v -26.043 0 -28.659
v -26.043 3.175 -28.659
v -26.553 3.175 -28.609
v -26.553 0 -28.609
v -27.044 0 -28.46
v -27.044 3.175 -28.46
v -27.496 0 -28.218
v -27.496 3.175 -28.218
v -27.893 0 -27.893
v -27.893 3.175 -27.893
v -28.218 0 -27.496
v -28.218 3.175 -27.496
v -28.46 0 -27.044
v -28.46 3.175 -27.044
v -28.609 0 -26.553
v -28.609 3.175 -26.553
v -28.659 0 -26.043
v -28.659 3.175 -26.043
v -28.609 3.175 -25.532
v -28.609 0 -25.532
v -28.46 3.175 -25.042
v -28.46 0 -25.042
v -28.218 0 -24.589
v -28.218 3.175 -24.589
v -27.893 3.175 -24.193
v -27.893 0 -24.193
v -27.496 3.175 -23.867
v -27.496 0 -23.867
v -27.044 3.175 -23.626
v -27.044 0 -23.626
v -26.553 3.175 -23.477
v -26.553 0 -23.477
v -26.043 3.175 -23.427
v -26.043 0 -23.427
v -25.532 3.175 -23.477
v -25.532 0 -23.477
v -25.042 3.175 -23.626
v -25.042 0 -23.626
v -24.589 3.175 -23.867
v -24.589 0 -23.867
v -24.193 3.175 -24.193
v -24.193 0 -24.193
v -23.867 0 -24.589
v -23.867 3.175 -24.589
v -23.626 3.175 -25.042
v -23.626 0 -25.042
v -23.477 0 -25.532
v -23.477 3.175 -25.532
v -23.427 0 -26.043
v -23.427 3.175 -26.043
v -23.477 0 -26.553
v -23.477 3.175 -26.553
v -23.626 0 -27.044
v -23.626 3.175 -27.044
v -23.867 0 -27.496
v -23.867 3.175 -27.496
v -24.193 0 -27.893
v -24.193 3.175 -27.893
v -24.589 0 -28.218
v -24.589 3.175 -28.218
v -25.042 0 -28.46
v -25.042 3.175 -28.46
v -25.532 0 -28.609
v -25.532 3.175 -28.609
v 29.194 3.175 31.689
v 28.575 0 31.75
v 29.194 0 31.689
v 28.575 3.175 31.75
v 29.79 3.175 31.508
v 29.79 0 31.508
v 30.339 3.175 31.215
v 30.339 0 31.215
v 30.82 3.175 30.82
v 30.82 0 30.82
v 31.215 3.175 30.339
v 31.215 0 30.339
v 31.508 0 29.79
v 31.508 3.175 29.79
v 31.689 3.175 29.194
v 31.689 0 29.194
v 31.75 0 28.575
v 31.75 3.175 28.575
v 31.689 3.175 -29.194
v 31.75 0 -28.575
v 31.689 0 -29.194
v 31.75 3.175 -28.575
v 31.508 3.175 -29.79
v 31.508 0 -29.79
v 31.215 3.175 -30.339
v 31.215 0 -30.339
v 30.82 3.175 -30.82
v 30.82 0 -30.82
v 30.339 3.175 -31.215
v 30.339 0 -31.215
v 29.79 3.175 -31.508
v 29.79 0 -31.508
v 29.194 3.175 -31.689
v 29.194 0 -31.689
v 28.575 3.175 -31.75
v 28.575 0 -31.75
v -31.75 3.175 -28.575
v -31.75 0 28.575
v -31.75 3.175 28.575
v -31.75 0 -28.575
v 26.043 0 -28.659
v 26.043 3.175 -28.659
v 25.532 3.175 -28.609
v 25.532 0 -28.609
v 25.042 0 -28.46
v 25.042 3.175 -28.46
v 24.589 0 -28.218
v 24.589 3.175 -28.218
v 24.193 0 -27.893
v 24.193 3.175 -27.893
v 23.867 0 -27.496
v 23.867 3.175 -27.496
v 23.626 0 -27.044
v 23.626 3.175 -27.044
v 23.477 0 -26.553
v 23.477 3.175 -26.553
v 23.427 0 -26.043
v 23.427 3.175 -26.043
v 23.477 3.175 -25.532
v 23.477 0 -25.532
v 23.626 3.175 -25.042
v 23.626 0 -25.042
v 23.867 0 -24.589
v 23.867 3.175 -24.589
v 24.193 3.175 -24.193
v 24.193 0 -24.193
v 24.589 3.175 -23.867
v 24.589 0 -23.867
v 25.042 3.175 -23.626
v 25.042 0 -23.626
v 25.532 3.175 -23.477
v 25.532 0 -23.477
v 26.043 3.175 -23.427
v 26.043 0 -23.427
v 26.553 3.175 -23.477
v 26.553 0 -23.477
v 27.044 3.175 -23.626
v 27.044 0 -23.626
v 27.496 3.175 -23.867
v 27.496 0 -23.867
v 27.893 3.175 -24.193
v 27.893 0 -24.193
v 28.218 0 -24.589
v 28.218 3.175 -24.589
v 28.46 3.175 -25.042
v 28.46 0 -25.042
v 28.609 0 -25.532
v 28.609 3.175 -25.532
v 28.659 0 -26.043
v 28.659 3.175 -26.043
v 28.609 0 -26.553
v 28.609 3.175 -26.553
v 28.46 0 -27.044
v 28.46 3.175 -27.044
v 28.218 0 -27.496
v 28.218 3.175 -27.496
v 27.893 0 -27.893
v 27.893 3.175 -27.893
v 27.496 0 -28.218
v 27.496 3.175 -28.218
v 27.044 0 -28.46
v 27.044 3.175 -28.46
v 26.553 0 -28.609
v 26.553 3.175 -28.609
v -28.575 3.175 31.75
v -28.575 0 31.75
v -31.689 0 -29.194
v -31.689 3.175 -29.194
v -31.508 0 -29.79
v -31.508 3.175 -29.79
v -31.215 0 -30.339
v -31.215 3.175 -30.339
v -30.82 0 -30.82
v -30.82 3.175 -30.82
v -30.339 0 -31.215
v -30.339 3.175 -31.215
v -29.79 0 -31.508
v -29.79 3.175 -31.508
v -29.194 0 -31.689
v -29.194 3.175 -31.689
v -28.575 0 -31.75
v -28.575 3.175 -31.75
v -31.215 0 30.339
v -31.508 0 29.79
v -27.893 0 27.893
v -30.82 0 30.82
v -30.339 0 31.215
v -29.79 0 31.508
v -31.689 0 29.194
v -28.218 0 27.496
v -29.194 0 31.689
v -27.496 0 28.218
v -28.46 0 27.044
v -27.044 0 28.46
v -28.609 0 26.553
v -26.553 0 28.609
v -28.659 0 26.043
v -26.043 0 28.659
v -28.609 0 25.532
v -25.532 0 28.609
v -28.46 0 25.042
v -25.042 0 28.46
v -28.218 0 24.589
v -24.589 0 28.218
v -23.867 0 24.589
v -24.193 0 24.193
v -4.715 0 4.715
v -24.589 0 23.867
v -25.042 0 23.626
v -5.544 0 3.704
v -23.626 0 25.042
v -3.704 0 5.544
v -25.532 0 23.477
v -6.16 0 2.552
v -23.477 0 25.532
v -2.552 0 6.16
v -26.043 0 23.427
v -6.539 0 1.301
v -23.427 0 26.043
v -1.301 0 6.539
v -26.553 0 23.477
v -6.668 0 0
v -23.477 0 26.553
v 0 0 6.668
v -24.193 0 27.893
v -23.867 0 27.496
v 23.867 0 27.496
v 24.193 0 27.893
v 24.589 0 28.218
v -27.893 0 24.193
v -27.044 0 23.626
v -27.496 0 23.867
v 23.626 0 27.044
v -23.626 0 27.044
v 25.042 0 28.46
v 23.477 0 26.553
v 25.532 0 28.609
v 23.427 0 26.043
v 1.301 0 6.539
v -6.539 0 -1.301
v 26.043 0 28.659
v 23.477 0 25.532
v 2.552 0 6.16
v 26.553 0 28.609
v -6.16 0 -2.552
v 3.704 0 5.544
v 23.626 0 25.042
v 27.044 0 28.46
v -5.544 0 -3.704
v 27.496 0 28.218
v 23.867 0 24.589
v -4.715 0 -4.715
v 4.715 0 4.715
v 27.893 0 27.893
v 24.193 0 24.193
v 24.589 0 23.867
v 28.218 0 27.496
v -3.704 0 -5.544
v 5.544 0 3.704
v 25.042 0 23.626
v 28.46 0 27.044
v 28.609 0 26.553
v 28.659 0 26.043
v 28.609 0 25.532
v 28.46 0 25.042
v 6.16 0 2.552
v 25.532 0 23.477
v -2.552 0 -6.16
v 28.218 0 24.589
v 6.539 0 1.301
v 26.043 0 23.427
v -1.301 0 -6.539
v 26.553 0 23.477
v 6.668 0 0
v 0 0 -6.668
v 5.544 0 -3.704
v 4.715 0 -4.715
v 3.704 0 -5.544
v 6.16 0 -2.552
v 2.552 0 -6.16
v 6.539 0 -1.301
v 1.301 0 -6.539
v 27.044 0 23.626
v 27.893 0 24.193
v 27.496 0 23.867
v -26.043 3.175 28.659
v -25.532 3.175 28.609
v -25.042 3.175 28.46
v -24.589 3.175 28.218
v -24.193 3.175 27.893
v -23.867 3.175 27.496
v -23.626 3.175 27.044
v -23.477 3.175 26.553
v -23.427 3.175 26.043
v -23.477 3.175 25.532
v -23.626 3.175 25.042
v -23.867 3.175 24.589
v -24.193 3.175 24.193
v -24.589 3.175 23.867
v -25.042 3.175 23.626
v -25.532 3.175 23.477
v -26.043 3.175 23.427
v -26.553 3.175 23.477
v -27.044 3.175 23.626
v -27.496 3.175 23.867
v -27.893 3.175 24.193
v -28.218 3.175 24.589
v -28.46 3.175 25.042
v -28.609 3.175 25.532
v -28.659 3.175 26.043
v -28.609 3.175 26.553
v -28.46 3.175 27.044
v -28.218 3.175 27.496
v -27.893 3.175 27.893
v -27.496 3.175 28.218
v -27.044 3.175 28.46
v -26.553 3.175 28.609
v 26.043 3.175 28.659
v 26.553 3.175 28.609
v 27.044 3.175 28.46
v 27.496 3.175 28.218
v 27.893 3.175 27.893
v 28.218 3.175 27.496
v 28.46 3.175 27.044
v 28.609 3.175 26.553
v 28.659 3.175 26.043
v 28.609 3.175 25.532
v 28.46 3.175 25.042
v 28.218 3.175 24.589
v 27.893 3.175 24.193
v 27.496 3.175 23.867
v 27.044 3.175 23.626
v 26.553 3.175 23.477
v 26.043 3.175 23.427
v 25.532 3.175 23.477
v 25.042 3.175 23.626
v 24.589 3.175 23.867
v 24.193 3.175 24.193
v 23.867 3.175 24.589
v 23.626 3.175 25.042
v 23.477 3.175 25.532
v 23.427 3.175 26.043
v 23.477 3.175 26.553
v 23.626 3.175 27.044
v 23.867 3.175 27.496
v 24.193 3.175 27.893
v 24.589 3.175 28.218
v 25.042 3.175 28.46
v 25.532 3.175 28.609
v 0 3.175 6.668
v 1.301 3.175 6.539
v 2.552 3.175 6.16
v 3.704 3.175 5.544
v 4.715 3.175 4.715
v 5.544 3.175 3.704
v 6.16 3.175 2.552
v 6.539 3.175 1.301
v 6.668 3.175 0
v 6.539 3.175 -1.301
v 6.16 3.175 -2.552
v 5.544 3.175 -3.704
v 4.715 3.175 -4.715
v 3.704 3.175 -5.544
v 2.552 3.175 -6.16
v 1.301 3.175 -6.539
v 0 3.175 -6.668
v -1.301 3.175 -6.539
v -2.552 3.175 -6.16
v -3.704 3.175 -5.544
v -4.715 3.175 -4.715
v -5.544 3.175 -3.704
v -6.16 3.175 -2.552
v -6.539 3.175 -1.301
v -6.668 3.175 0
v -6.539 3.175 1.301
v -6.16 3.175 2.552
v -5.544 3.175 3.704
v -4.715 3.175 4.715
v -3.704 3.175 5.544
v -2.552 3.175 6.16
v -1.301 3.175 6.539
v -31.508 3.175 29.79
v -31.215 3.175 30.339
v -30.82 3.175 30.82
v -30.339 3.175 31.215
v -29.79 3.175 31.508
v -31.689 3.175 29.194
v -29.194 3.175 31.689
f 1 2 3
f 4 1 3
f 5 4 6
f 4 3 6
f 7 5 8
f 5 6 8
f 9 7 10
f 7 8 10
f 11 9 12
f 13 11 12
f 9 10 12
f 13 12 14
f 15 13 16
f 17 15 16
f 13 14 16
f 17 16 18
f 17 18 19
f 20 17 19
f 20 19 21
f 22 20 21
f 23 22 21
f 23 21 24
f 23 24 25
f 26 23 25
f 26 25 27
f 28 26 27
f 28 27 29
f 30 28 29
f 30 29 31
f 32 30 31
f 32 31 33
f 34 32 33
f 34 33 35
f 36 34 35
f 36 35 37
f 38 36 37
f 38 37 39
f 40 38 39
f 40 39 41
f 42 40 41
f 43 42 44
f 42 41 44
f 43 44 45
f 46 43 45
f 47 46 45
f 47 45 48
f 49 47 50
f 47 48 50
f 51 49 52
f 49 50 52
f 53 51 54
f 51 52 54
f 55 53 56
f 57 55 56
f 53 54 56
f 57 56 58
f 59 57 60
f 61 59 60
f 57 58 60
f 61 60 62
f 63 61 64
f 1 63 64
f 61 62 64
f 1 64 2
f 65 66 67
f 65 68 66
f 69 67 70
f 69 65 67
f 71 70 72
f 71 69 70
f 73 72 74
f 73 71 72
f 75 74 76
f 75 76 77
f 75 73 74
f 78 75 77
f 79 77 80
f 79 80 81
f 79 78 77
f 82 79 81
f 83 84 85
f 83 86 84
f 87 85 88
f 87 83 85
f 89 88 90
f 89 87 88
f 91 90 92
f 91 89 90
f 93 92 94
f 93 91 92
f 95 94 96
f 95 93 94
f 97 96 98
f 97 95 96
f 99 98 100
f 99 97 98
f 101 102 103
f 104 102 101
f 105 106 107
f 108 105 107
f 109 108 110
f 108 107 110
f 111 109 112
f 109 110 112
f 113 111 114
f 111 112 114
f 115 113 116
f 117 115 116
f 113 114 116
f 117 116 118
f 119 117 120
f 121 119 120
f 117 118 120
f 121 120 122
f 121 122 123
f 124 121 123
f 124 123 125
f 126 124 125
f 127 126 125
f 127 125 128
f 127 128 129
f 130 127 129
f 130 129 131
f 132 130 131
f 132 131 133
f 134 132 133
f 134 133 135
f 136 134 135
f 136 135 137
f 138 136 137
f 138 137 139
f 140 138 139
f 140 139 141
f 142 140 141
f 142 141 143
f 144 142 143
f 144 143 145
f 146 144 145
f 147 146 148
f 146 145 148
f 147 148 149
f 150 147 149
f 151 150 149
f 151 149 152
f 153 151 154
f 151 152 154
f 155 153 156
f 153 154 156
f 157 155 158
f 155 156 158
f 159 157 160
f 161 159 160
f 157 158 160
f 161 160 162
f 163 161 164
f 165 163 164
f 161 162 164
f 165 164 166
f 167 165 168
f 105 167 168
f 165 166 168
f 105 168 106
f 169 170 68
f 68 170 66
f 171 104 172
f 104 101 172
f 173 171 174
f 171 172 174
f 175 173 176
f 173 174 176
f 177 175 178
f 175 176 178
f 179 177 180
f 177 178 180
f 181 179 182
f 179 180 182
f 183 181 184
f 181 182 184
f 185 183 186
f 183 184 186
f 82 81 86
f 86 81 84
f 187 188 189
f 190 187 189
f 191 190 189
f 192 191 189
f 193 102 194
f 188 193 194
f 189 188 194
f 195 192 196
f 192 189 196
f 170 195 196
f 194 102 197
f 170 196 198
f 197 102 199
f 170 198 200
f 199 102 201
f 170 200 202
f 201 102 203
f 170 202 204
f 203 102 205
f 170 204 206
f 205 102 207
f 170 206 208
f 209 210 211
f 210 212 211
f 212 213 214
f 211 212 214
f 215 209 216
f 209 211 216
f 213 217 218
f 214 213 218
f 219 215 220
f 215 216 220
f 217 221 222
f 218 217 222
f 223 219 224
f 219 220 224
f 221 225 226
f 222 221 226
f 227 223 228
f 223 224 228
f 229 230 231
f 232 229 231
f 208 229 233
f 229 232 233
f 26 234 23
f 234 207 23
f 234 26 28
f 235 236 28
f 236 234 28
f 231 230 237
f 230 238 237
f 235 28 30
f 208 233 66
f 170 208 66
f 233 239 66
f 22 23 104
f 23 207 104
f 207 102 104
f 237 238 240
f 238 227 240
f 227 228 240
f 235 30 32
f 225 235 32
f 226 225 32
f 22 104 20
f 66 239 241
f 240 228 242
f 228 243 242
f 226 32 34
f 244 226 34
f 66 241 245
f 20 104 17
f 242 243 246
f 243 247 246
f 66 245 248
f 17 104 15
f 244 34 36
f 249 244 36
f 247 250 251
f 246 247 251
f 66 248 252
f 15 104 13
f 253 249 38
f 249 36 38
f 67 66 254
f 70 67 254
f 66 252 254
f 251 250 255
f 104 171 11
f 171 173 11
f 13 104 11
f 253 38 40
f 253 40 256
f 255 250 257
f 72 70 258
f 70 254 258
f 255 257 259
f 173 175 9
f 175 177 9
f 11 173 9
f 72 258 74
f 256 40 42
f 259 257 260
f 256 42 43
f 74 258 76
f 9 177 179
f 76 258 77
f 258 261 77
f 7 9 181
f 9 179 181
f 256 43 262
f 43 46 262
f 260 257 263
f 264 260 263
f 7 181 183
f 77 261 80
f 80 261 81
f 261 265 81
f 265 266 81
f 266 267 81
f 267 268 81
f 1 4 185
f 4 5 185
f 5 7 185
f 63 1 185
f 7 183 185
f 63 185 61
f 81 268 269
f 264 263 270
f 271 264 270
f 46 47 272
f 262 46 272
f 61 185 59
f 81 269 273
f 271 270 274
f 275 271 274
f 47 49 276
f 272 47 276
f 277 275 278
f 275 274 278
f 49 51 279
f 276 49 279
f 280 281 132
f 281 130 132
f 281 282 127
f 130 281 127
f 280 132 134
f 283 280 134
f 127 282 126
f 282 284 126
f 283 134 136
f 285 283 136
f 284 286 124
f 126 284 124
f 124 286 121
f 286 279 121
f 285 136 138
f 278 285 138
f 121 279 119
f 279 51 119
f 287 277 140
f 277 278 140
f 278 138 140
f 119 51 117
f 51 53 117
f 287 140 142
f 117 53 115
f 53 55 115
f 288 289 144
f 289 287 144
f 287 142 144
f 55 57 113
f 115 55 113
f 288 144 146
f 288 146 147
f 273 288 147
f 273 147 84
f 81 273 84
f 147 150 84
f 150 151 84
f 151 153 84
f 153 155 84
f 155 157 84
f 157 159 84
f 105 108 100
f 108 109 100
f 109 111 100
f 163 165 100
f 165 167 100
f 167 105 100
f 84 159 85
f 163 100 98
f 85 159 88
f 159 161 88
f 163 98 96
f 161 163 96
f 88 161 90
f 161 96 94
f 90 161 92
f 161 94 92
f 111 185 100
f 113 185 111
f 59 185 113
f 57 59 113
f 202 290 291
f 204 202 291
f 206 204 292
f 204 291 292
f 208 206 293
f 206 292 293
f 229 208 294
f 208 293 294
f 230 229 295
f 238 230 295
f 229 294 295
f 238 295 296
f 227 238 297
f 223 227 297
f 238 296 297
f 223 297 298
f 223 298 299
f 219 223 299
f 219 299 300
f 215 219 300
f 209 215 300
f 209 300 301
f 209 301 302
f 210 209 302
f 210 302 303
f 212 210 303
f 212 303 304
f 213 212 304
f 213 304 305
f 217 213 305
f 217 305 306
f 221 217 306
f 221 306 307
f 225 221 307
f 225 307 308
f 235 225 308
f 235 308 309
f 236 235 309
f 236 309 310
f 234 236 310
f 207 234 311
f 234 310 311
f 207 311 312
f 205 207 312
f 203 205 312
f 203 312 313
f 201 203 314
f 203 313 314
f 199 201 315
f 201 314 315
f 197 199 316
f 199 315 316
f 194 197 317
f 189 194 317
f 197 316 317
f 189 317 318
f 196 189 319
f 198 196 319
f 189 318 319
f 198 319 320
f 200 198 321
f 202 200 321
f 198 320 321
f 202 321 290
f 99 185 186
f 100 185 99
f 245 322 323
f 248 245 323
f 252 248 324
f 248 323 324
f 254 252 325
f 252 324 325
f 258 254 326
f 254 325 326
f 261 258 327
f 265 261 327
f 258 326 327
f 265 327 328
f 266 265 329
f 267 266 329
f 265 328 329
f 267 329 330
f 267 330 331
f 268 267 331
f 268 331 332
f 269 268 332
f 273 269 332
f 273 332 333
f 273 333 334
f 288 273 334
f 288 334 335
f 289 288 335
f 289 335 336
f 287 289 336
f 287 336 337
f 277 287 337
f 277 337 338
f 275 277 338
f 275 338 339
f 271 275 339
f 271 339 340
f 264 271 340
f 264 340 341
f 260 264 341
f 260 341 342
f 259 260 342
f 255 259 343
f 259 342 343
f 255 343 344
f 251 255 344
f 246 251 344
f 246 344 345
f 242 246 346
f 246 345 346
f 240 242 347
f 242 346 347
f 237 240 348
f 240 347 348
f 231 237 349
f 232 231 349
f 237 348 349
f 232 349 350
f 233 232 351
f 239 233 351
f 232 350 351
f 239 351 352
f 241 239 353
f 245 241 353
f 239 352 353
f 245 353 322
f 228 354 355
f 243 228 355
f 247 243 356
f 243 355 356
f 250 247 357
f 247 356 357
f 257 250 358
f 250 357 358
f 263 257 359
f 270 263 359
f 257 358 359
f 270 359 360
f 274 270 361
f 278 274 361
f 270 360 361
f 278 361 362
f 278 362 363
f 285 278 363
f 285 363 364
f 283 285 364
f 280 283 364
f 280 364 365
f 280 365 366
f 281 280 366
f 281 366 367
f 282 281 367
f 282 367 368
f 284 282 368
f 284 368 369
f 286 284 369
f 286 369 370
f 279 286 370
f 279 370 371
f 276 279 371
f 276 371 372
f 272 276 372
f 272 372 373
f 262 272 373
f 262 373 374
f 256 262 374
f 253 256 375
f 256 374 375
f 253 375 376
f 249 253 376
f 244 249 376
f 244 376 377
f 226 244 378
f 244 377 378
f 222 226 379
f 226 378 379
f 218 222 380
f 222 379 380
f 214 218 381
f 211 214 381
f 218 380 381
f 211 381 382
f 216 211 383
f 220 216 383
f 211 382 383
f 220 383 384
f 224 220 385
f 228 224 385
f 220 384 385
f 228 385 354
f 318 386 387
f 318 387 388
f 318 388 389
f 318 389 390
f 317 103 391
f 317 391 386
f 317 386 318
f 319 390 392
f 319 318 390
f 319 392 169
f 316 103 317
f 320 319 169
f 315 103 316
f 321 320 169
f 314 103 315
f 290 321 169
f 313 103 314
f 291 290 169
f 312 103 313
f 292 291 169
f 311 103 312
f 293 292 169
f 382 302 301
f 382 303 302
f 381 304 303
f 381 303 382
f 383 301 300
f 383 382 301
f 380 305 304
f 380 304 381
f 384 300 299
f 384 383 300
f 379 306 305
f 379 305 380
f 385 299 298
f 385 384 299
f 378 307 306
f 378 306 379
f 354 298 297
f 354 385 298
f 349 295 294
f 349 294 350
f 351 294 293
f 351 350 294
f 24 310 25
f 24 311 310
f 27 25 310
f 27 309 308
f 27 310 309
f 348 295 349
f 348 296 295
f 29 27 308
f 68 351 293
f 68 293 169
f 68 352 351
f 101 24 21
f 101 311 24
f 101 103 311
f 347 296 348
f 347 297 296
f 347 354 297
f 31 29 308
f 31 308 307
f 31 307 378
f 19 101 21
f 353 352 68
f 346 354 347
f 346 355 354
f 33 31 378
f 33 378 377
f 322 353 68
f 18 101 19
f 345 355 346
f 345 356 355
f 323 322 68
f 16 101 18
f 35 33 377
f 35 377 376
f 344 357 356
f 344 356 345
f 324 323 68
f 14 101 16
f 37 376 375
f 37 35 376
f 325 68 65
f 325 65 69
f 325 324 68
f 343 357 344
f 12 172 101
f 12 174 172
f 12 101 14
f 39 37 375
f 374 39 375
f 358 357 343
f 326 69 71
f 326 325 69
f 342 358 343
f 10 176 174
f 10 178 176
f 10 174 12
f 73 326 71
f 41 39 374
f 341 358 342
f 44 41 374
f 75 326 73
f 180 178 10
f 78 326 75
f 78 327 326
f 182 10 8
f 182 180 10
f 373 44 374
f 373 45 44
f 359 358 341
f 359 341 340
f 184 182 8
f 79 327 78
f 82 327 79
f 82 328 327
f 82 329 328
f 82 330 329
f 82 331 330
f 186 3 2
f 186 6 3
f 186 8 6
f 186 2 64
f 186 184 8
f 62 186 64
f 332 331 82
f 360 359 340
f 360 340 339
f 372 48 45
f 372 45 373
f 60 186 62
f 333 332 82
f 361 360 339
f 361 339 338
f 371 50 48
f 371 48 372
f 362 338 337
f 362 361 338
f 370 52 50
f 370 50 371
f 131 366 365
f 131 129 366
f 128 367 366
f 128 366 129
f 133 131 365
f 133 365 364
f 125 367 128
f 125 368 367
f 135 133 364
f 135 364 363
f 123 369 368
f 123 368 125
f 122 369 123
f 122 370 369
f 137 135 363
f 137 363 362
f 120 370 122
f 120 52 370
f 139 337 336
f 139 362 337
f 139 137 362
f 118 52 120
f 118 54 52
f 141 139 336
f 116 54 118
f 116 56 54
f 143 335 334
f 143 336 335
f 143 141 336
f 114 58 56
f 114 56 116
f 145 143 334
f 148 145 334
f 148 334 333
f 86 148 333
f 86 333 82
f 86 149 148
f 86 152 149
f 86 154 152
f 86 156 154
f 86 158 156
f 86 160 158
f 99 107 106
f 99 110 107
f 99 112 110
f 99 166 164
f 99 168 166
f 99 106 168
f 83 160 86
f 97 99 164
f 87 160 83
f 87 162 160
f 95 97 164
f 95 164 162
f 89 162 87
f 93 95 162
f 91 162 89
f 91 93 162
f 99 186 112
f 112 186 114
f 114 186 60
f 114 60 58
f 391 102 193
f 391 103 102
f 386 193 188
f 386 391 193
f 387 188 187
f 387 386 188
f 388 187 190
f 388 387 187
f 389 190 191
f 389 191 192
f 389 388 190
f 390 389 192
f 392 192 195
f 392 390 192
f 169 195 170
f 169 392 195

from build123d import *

# Parameters (mm, degrees)
SKETCH1_W           = 63.5
SKETCH1_H           = 63.5
BOSS_EXTRUDE1_DEPTH = 3.175
FILLET1_R           = 3.175
CUT_EXTRUDE1_REACH  = 47.013
SKETCH2_R           = 6.6675
CUT_EXTRUDE2_REACH  = 47.013
SKETCH3_R           = 2.6162


with BuildPart() as part:
    # Sketch1 → Boss-Extrude1 (new body)
    with BuildSketch(Plane(origin=(0, 0, 0), x_dir=(1, 0, 0), z_dir=(0, 1, 0))):
        Rectangle(SKETCH1_W, SKETCH1_H)
    extrude(amount=BOSS_EXTRUDE1_DEPTH)

    # Fillet1
    fillet1_edges = [part.edges().sort_by_distance(p)[0] for p in [
        (31.75, 1.5875, 31.75),
        (-31.75, 1.5875, 31.75),
        (-31.75, 1.5875, -31.75),
        (31.75, 1.5875, -31.75),
    ]]
    fillet(fillet1_edges, radius=FILLET1_R)

    # Sketch2 → Cut-Extrude1 (cut, up to next)
    with BuildSketch(Plane(origin=(0, 3.175, 0), x_dir=(1, 0, 0), z_dir=(0, 1, 0)), mode=Mode.PRIVATE) as cut_extrude1_sk1:
        with Locations(Location((0, 0, 0), (0, 0, 270))):
            Circle(SKETCH2_R)
    cut_extrude1_tool1 = extrude(cut_extrude1_sk1.sketch, amount=-CUT_EXTRUDE1_REACH, mode=Mode.PRIVATE) & part.part
    add(cut_extrude1_tool1.solids().sort_by_distance((0, 3.175, 0))[0], mode=Mode.SUBTRACT)

    # Sketch3 → Cut-Extrude2 (cut, up to next)
    with BuildSketch(Plane(origin=(0, 3.175, 0), x_dir=(1, 0, 0), z_dir=(0, 1, 0)), mode=Mode.PRIVATE) as cut_extrude2_sk1:
        with Locations(Location((26.042742751, -26.042742751, 0), (0, 0, 270))):
            Circle(SKETCH3_R)
    cut_extrude2_tool1 = extrude(cut_extrude2_sk1.sketch, amount=-CUT_EXTRUDE2_REACH, mode=Mode.PRIVATE) & part.part
    # Sketch3 → Cut-Extrude2 (cut, up to next)
    with BuildSketch(Plane(origin=(0, 3.175, 0), x_dir=(1, 0, 0), z_dir=(0, 1, 0)), mode=Mode.PRIVATE) as cut_extrude2_sk2:
        with Locations(Location((-26.042742751, -26.042742751, 0), (0, 0, 270))):
            Circle(SKETCH3_R)
    cut_extrude2_tool2 = extrude(cut_extrude2_sk2.sketch, amount=-CUT_EXTRUDE2_REACH, mode=Mode.PRIVATE) & part.part
    # Sketch3 → Cut-Extrude2 (cut, up to next)
    with BuildSketch(Plane(origin=(0, 3.175, 0), x_dir=(1, 0, 0), z_dir=(0, 1, 0)), mode=Mode.PRIVATE) as cut_extrude2_sk3:
        with Locations(Location((26.042742751, 26.042742751, 0), (0, 0, 90))):
            Circle(SKETCH3_R)
    cut_extrude2_tool3 = extrude(cut_extrude2_sk3.sketch, amount=-CUT_EXTRUDE2_REACH, mode=Mode.PRIVATE) & part.part
    # Sketch3 → Cut-Extrude2 (cut, up to next)
    with BuildSketch(Plane(origin=(0, 3.175, 0), x_dir=(1, 0, 0), z_dir=(0, 1, 0)), mode=Mode.PRIVATE) as cut_extrude2_sk4:
        with Locations(Location((-26.042742751, 26.042742751, 0), (0, 0, 90))):
            Circle(SKETCH3_R)
    cut_extrude2_tool4 = extrude(cut_extrude2_sk4.sketch, amount=-CUT_EXTRUDE2_REACH, mode=Mode.PRIVATE) & part.part
    add(cut_extrude2_tool1.solids().sort_by_distance((26.042743, 3.175, 26.042743))[0], mode=Mode.SUBTRACT)
    add(cut_extrude2_tool2.solids().sort_by_distance((-26.042743, 3.175, 26.042743))[0], mode=Mode.SUBTRACT)
    add(cut_extrude2_tool3.solids().sort_by_distance((26.042743, 3.175, -26.042743))[0], mode=Mode.SUBTRACT)
    add(cut_extrude2_tool4.solids().sort_by_distance((-26.042743, 3.175, -26.042743))[0], mode=Mode.SUBTRACT)


solid = part.part
